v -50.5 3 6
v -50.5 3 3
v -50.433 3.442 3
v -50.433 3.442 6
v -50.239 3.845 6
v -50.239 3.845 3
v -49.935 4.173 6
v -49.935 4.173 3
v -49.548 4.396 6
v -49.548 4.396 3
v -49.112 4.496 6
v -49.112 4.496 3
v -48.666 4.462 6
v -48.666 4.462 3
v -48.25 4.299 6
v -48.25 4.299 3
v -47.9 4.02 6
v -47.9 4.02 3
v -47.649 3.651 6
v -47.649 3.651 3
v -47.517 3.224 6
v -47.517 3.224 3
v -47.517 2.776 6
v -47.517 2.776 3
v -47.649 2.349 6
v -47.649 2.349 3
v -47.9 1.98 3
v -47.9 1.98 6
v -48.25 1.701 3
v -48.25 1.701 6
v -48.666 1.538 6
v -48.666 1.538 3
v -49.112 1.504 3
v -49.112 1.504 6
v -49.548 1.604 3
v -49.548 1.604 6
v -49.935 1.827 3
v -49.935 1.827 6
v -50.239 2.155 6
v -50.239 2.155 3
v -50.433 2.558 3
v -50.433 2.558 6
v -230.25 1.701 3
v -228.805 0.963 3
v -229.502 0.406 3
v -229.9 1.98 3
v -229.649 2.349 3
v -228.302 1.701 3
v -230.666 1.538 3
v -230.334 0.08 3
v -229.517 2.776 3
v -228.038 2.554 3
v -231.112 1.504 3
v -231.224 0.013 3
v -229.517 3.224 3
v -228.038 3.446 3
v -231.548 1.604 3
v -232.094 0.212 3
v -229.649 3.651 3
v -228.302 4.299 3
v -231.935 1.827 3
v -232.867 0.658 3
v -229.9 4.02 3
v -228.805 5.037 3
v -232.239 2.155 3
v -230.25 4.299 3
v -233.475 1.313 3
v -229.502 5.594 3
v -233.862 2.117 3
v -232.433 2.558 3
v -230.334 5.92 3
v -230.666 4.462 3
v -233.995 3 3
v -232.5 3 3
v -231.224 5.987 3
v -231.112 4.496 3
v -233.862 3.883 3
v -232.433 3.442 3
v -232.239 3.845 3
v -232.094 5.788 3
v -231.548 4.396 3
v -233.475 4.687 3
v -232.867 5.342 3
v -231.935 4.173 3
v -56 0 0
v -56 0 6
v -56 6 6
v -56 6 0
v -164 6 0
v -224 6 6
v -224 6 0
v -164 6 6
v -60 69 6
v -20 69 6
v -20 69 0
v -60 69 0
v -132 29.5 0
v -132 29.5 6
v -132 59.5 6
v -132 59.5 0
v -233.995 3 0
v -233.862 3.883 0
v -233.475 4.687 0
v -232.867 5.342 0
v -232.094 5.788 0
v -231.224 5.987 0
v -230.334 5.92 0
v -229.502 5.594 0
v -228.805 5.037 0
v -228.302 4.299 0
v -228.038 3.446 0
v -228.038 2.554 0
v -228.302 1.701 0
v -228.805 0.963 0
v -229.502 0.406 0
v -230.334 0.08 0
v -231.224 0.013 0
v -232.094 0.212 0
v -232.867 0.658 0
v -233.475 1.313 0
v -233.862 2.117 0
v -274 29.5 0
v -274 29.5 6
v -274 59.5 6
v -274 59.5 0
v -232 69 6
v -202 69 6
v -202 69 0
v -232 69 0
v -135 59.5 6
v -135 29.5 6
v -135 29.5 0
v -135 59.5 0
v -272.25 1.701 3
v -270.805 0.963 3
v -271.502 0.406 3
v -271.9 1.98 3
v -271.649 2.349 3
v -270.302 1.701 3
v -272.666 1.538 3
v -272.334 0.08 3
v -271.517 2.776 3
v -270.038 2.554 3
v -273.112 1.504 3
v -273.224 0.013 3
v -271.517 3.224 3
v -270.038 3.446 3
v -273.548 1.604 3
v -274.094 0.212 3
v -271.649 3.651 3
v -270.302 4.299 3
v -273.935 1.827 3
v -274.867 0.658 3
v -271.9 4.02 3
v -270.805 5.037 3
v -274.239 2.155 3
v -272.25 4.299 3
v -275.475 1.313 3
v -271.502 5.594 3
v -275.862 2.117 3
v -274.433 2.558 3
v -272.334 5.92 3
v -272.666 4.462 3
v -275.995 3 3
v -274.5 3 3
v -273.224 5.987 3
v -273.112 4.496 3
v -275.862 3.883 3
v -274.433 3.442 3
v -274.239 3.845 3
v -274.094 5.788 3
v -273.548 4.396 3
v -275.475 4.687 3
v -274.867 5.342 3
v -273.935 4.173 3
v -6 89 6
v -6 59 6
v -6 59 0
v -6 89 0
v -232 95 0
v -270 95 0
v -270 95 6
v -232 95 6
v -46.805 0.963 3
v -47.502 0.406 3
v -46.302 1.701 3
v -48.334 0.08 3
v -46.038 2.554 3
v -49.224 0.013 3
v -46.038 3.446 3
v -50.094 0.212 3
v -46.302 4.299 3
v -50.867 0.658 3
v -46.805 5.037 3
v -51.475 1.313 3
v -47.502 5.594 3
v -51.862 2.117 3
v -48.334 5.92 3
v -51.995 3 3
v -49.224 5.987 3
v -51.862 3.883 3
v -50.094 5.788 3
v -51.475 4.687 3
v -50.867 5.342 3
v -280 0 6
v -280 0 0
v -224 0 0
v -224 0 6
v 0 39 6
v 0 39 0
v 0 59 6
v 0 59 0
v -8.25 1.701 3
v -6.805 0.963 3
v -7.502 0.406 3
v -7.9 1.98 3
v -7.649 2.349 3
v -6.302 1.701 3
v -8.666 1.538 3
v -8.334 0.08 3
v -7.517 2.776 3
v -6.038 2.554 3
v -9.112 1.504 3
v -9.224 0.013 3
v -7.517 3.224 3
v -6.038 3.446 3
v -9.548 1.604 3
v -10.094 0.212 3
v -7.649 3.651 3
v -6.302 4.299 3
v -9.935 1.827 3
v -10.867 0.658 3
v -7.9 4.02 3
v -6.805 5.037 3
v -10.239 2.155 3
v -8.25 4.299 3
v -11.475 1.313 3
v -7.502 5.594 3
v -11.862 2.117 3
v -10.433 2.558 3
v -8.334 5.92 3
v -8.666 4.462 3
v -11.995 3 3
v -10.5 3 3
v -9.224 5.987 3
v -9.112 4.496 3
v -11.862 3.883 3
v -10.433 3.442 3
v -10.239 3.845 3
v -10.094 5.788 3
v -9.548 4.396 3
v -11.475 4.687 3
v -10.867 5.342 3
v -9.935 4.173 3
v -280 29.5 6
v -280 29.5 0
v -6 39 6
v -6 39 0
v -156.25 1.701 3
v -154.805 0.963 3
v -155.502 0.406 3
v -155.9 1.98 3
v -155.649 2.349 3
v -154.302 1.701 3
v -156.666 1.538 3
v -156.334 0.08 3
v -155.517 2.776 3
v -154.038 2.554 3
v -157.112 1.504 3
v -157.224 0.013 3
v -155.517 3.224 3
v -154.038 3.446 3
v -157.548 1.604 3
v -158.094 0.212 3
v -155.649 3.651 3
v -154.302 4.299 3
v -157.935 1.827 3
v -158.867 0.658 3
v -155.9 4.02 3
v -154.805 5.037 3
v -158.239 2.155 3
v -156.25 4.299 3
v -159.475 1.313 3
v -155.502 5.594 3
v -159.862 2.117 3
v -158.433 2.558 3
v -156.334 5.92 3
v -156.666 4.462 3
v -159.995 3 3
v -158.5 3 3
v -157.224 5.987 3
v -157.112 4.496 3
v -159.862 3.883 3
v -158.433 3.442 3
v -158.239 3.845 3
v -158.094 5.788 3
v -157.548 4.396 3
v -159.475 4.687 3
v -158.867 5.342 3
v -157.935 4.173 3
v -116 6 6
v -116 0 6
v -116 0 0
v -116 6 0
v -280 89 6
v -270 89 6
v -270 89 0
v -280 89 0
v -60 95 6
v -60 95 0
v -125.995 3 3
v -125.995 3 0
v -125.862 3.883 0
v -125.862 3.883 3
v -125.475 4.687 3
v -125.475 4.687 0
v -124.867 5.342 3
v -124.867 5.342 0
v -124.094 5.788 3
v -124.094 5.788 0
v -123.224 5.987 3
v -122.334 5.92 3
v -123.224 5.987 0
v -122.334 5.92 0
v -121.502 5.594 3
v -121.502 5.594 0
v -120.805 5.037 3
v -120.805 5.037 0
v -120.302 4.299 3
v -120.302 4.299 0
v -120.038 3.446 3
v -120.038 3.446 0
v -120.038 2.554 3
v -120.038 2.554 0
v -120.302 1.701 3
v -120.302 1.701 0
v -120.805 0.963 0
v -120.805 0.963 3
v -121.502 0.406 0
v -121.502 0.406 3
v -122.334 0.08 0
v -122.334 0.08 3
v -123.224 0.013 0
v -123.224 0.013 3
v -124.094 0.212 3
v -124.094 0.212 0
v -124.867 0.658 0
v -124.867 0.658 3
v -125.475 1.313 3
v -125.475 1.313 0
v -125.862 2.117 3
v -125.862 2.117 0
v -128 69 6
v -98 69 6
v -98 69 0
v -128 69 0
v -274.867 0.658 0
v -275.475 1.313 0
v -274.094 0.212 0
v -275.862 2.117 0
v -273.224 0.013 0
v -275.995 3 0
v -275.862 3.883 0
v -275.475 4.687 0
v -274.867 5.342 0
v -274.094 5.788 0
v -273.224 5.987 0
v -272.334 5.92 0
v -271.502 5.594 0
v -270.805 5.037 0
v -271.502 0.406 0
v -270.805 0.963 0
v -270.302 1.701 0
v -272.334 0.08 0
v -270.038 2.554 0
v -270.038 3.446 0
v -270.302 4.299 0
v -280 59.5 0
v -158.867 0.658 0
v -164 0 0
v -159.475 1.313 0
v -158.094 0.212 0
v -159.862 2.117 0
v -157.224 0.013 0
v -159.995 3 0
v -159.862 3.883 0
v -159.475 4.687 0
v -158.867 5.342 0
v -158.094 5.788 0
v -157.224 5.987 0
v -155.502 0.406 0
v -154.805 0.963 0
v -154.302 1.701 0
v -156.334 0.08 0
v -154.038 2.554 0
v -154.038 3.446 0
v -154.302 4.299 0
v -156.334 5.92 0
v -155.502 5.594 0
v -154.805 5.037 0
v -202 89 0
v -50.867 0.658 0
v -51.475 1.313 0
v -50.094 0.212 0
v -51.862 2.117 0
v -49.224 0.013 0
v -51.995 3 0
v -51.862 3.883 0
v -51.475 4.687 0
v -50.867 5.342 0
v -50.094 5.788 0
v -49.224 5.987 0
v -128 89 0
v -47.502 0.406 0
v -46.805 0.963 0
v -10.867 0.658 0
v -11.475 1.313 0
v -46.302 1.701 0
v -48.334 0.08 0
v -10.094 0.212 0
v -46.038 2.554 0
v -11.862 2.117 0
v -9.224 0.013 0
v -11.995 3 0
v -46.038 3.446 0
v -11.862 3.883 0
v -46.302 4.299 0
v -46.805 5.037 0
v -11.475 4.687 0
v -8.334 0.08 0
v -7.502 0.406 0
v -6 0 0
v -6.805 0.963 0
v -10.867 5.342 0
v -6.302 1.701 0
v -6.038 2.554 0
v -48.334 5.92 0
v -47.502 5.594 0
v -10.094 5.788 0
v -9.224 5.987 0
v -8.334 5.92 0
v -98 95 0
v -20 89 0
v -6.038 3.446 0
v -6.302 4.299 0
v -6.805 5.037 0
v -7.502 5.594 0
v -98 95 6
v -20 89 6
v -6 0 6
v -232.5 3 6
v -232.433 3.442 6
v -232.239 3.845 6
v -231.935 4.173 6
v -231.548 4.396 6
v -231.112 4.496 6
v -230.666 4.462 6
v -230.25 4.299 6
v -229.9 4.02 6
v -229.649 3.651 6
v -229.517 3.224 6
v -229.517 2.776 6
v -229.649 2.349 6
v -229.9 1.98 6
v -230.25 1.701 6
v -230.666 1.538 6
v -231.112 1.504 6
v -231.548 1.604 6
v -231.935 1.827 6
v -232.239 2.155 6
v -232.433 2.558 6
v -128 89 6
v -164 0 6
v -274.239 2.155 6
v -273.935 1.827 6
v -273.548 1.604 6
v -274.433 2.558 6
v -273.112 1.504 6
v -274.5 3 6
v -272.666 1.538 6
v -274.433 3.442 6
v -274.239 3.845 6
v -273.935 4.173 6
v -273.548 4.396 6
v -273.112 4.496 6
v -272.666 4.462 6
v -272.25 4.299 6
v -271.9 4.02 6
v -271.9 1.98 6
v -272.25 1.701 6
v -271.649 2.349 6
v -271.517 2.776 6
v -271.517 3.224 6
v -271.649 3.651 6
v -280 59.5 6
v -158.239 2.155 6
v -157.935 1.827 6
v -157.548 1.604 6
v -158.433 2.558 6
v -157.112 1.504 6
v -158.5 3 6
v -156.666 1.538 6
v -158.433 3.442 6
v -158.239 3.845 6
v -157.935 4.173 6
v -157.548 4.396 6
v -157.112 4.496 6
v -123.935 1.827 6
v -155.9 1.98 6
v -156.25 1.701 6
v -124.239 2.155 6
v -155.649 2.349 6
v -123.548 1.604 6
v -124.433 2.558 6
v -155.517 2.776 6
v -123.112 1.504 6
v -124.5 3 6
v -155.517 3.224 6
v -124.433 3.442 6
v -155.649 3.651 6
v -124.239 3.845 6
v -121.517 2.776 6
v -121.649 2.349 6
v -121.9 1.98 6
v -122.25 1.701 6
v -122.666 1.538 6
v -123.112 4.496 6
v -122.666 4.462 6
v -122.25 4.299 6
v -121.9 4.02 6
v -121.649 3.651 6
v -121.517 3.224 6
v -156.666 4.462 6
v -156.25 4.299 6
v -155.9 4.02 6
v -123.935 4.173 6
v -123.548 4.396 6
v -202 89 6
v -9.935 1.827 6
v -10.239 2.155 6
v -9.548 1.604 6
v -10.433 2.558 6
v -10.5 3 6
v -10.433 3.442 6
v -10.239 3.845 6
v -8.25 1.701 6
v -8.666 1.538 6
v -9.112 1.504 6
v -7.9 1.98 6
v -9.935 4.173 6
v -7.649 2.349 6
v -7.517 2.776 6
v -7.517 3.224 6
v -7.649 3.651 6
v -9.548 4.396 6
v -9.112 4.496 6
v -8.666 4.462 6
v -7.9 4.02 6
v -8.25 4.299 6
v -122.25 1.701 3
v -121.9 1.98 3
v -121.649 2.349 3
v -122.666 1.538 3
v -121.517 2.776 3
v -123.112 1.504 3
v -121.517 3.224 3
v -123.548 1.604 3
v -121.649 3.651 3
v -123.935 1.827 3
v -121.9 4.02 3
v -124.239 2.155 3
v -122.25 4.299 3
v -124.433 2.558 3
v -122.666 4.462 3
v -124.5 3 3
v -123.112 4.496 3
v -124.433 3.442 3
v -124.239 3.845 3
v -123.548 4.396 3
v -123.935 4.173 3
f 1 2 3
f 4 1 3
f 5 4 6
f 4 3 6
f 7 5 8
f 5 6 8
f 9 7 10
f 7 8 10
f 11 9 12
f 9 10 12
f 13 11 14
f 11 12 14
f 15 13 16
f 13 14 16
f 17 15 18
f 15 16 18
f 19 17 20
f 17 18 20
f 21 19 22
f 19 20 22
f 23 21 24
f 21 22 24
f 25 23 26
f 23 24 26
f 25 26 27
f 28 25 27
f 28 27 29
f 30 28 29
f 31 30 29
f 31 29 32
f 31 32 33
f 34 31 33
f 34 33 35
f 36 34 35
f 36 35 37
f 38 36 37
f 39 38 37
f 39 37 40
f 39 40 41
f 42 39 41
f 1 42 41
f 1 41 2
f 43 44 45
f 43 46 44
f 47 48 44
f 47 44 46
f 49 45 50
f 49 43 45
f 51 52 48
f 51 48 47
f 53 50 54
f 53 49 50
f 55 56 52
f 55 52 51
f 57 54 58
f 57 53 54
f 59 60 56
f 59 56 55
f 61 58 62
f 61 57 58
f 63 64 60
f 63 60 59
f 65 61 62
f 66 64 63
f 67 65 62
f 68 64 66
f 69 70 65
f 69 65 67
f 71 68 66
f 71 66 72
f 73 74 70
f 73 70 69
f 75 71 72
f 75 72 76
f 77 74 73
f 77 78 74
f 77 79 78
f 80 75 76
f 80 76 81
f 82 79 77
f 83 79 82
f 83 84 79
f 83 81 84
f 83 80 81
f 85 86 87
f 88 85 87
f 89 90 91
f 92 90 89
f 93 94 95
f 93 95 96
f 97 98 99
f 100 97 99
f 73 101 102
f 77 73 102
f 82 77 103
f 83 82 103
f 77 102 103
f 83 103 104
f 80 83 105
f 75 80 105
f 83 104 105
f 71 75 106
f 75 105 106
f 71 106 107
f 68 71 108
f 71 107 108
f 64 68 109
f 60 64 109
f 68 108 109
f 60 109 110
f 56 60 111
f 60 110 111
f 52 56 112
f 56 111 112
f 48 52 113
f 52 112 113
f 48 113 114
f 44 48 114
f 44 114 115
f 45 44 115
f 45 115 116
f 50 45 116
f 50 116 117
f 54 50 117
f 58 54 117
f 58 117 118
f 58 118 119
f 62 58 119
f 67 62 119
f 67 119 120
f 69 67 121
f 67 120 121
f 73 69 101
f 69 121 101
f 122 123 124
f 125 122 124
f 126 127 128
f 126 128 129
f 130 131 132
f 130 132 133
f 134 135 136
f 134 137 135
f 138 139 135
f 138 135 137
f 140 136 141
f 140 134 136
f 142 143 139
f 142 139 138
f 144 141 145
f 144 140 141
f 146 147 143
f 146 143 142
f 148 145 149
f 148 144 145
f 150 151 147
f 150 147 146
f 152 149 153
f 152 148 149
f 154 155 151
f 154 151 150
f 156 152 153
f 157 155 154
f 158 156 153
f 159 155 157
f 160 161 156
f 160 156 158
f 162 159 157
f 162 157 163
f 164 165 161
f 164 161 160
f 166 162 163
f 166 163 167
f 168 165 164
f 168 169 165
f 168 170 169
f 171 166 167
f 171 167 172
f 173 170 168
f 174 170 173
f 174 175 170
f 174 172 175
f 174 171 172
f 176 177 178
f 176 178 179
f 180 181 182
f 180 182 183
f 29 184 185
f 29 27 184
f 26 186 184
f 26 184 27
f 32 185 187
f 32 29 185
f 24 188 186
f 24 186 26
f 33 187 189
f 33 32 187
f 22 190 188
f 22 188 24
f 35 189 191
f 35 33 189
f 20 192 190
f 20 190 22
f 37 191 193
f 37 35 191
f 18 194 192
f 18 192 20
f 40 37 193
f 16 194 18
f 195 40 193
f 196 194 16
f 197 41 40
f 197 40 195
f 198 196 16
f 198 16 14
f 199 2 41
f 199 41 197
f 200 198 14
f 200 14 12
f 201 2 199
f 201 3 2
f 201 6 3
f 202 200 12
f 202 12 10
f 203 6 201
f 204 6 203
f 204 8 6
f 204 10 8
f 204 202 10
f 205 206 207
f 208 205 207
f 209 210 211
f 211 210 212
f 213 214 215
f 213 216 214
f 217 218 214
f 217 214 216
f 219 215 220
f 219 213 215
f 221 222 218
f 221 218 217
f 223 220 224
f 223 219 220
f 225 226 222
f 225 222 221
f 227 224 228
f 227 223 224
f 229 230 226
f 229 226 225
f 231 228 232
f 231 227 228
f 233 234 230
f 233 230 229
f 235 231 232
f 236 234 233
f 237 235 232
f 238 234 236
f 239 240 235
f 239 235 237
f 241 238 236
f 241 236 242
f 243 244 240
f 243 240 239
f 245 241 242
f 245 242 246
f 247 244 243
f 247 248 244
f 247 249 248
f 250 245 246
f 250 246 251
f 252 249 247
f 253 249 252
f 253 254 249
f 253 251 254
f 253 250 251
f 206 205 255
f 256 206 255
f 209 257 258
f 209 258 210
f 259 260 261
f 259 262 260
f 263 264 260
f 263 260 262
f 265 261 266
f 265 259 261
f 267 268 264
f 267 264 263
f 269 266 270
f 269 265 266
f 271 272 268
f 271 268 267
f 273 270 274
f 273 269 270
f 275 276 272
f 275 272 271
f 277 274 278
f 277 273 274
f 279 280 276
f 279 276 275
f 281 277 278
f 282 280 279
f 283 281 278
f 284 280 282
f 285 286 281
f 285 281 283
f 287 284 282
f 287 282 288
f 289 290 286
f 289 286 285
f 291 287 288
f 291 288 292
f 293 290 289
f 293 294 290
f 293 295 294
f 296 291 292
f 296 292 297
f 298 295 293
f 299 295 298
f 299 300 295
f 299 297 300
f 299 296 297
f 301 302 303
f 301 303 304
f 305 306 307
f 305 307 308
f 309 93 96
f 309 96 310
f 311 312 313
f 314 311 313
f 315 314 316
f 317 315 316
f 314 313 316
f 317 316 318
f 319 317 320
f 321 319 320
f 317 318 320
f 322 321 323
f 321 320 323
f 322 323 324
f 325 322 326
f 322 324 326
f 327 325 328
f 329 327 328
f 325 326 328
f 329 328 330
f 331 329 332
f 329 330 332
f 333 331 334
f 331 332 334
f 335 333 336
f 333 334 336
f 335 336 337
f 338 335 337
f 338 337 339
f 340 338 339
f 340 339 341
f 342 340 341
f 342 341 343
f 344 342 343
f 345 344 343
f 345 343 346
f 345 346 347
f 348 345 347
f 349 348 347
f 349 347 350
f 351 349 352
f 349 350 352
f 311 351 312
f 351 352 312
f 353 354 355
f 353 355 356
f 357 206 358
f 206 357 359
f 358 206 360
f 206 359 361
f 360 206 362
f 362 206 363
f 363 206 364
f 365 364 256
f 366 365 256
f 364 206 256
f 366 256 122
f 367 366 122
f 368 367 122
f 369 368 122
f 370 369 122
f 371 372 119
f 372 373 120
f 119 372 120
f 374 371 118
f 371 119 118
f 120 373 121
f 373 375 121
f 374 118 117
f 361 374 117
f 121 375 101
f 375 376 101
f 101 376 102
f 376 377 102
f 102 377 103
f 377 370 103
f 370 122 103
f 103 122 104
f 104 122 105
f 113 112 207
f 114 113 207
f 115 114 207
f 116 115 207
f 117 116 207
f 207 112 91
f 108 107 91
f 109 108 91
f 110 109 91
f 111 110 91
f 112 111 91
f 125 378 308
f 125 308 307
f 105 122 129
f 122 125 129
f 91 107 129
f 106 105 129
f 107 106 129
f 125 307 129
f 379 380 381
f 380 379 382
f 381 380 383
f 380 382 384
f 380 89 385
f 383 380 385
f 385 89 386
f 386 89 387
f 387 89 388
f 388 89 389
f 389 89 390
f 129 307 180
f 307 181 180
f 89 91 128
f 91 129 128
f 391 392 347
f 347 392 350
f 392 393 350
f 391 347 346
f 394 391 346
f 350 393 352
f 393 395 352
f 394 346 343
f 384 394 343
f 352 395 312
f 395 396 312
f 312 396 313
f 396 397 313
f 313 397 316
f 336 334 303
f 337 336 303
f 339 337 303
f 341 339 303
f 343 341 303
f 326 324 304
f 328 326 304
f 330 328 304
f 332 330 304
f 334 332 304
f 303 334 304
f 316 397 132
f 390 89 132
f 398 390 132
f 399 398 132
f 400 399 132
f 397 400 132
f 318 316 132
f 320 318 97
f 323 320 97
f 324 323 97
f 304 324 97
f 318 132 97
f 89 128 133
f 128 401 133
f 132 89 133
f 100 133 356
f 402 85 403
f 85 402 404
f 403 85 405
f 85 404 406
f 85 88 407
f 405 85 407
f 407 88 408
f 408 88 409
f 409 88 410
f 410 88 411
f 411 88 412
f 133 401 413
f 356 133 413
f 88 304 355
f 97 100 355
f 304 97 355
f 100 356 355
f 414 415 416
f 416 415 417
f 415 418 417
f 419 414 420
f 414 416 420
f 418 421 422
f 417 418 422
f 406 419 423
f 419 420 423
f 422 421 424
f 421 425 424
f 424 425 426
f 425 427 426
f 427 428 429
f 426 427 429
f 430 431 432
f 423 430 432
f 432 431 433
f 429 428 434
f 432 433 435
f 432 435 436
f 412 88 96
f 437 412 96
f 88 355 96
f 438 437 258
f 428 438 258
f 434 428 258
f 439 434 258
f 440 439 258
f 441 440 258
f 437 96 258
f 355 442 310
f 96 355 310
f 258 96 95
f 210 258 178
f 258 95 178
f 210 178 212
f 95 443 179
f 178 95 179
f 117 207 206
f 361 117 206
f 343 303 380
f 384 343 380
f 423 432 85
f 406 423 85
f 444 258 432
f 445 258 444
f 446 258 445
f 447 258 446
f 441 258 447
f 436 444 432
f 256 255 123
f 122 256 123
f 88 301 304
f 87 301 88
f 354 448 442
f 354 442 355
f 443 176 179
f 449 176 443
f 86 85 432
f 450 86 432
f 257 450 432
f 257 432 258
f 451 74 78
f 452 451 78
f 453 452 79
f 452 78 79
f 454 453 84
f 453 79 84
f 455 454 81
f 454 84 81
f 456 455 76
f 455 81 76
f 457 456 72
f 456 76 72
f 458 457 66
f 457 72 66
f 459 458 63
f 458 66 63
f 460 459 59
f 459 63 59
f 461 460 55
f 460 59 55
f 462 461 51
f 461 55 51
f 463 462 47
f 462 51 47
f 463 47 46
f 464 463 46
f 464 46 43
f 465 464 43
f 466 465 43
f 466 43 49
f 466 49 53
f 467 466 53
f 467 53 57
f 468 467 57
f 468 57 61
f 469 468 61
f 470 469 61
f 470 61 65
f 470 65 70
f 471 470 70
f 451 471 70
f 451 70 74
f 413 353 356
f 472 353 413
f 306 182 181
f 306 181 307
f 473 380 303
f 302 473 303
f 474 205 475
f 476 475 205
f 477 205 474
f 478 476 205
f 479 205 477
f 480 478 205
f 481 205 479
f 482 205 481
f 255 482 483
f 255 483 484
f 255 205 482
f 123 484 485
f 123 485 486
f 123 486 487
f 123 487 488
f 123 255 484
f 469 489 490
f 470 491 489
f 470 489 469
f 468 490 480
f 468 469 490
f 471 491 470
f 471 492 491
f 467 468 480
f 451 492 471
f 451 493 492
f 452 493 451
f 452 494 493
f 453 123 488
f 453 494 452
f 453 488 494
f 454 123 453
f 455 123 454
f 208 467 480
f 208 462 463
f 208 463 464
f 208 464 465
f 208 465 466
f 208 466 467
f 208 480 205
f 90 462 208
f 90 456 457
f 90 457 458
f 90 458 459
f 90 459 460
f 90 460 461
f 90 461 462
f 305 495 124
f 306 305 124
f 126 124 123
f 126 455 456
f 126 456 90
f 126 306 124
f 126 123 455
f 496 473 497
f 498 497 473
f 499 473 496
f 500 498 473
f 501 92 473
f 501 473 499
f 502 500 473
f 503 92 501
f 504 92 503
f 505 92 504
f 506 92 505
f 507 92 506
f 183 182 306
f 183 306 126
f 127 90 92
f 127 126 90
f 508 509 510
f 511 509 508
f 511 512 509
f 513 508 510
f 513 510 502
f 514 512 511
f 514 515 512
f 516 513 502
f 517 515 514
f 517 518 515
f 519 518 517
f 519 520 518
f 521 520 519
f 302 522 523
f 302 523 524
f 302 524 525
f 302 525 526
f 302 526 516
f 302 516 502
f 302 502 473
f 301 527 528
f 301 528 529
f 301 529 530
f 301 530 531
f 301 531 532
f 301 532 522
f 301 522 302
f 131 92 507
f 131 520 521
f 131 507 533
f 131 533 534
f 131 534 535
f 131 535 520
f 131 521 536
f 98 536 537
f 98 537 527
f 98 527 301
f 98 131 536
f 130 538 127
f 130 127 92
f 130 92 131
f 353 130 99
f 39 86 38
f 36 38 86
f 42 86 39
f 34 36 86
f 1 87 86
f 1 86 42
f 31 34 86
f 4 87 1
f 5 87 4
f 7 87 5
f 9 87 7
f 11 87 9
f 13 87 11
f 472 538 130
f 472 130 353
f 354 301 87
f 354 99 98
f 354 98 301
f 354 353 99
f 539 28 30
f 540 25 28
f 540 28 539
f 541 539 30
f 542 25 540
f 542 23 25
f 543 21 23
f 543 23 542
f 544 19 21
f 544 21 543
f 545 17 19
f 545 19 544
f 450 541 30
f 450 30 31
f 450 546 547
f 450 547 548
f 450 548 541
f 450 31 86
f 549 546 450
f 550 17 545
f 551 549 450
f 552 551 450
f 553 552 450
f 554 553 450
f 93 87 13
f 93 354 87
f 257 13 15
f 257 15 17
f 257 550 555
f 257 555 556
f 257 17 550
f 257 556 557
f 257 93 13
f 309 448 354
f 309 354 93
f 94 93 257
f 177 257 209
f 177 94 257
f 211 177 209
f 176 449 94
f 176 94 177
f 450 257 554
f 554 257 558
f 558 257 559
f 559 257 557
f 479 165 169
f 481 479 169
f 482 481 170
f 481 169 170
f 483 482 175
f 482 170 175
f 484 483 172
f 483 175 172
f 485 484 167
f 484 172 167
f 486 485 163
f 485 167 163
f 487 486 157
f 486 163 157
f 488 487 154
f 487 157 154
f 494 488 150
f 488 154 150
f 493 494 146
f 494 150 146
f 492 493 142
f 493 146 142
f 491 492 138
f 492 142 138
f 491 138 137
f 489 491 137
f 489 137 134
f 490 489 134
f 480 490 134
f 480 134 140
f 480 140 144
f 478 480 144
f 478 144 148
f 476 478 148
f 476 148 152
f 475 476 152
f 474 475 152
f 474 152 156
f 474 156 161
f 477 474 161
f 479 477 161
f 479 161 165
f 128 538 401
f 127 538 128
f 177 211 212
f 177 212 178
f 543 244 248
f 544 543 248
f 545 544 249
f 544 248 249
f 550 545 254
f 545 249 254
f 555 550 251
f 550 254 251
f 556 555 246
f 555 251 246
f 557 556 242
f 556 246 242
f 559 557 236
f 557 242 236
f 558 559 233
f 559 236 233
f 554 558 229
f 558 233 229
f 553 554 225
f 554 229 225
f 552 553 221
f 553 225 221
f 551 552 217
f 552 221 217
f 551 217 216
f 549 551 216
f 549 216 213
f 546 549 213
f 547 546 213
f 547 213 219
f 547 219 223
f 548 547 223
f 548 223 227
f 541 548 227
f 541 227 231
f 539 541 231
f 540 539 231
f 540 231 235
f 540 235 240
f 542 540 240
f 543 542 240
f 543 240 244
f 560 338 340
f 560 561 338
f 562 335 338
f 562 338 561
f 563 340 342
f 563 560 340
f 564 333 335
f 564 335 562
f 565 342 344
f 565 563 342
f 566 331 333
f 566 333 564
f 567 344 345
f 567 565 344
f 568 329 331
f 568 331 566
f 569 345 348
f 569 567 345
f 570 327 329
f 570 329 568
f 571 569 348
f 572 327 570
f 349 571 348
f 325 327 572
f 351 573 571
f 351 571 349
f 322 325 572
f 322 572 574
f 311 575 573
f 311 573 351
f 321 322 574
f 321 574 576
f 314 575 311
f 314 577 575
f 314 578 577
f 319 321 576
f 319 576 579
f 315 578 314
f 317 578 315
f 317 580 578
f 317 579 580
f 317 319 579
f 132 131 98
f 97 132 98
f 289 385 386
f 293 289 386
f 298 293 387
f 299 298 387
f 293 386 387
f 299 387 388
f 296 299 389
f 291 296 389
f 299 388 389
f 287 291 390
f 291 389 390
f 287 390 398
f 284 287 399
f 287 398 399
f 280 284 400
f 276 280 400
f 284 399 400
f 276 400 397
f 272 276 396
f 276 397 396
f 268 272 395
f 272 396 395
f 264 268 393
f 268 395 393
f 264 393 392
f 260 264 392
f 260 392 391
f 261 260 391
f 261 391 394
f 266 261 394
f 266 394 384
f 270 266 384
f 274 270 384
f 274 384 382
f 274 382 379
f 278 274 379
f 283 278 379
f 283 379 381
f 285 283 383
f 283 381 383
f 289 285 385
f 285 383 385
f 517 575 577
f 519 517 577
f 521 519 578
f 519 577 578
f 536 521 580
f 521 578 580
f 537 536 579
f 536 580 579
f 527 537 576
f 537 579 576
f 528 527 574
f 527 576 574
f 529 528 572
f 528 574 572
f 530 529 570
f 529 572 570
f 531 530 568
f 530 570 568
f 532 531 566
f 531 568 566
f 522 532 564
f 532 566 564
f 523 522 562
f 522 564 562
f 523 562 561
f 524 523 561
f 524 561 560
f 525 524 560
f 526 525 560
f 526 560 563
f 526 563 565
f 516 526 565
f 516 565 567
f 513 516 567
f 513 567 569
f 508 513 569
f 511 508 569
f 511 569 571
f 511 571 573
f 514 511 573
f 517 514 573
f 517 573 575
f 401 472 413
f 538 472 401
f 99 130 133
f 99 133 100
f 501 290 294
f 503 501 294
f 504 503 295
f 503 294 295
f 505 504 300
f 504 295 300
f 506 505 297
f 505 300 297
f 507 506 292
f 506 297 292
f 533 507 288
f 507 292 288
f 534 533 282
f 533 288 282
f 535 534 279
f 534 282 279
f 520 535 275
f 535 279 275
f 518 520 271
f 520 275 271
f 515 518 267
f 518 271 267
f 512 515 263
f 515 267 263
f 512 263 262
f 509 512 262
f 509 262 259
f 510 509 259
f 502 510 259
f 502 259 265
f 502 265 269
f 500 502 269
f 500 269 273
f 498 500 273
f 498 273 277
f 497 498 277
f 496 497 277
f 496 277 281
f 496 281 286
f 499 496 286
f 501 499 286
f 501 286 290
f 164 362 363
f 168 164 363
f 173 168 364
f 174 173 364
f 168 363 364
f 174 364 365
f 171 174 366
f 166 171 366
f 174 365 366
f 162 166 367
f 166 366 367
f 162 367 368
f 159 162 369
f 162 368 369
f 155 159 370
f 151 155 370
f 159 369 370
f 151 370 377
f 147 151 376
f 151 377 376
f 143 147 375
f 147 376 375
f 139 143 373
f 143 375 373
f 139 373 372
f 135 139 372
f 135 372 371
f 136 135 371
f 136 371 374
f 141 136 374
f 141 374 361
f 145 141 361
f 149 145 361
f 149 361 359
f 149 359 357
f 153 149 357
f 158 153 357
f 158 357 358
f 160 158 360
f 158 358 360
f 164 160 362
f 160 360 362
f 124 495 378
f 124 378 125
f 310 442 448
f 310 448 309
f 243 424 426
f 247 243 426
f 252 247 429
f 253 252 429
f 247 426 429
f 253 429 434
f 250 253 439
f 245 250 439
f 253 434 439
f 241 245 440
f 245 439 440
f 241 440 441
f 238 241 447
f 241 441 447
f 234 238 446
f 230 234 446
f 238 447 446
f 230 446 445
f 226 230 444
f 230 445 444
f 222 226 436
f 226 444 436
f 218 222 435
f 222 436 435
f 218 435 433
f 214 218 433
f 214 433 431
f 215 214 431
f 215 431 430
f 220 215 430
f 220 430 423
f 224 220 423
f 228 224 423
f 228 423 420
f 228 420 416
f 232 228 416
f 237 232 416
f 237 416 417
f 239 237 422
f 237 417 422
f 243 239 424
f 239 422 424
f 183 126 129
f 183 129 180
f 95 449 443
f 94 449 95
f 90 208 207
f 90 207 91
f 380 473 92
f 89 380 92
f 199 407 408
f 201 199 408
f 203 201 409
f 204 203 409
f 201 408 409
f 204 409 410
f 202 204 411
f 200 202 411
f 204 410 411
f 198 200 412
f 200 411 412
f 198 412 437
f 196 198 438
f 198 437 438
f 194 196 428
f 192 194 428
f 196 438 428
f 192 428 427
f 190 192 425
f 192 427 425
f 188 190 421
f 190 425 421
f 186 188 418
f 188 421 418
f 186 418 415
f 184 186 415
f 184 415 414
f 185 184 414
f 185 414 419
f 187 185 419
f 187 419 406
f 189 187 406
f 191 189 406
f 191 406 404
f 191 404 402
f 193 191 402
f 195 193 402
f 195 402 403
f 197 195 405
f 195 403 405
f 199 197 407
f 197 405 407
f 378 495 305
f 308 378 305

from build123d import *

# Parameters (mm, degrees)
ESQUISSE2_W             = 330
ESQUISSE2_H             = 95
BOSS_EXTRU_1_DEPTH      = 6
ESQUISSE3_W             = 6
ESQUISSE3_H             = 39
ESQUISSE3_W_2           = 60
ESQUISSE3_H_2           = 6
ESQUISSE3_H_3           = 30
ESQUISSE3_W_3           = 3
ENL_V_MAT_EXTRU_1_DEPTH = 344.45450936
ESQUISSE4_W             = 56.799161249
ESQUISSE4_H             = 89
ENL_V_MAT_EXTRU_2_DEPTH = 344.45450936
ESQUISSE5_R             = 1.5
ENL_V_MAT_EXTRU_3_DEPTH = 296.738059776
ESQUISSE6_R             = 2.995
ENL_V_MAT_EXTRU_5_DEPTH = 3


with BuildPart() as part:
    # Esquisse2 → Boss.-Extru.1 (new body)
    with BuildSketch(Plane.XY):
        with Locations((-165, 47.5)):
            Rectangle(ESQUISSE2_W, ESQUISSE2_H)
    extrude(amount=BOSS_EXTRU_1_DEPTH)

    # Esquisse3 → Enlèv. mat.-Extru.1 (cut, through all)
    with BuildSketch(Plane.XY.offset(6)):
        Polygon((-60, 95), (0, 95), (0, 59), (-6, 59), (-6, 89), (-20, 89), (-20, 69), (-60, 69), align=None)
        with Locations((-3, 19.5)):
            Rectangle(ESQUISSE3_W, ESQUISSE3_H)
        Polygon((-330, 95), (-270, 95), (-270, 89), (-324, 89), (-324, 59), (-330, 59), align=None)
        with Locations((-86, 3)):
            Rectangle(ESQUISSE3_W_2, ESQUISSE3_H_2)
        with Locations((-194, 3)):
            Rectangle(ESQUISSE3_W_2, ESQUISSE3_H_2)
        with Locations((-277, 44.5)):
            Rectangle(ESQUISSE3_W, ESQUISSE3_H_3)
        with Locations((-327, 19.5)):
            Rectangle(ESQUISSE3_W, ESQUISSE3_H)
        Polygon((-98, 95), (-98, 69), (-128, 69), (-128, 89), (-202, 89), (-202, 69), (-232, 69), (-232, 95), align=None)
        with Locations((-133.5, 44.5)):
            Rectangle(ESQUISSE3_W_3, ESQUISSE3_H_3)
    extrude(amount=-ENL_V_MAT_EXTRU_1_DEPTH, mode=Mode.SUBTRACT)

    # Esquisse4 → Enlèv. mat.-Extru.2 (cut, through all)
    with BuildSketch(Plane.XY.offset(6)):
        with Locations((-308.399580625, 44.5)):
            Rectangle(ESQUISSE4_W, ESQUISSE4_H)
    extrude(amount=-ENL_V_MAT_EXTRU_2_DEPTH, mode=Mode.SUBTRACT)

    # Esquisse5 → Enlèv. mat.-Extru.3 (cut, through all)
    with BuildSketch(Plane(origin=(0, 0, 0), x_dir=(-1, 0, 0), z_dir=(0, 0, -1))):
        with Locations((9, 3)):
            Circle(ESQUISSE5_R)
        with Locations((49, 3)):
            Circle(ESQUISSE5_R)
        with Locations((123, 3)):
            Circle(ESQUISSE5_R)
        with Locations((157, 3)):
            Circle(ESQUISSE5_R)
        with Locations((231, 3)):
            Circle(ESQUISSE5_R)
        with Locations((273, 3)):
            Circle(ESQUISSE5_R)
    extrude(amount=-ENL_V_MAT_EXTRU_3_DEPTH, mode=Mode.SUBTRACT)

    # Esquisse6 → Enlèv. mat.-Extru.5 (cut)
    with BuildSketch(Plane(origin=(0, 0, 0), x_dir=(-1, 0, 0), z_dir=(0, 0, -1))):
        with Locations((9, 3)):
            Circle(ESQUISSE6_R)
        with Locations((49, 3)):
            Circle(ESQUISSE6_R)
        with Locations((123, 3)):
            Circle(ESQUISSE6_R)
        with Locations((157, 3)):
            Circle(ESQUISSE6_R)
        with Locations((273, 3)):
            Circle(ESQUISSE6_R)
        with Locations((231, 3)):
            Circle(ESQUISSE6_R)
    extrude(amount=-ENL_V_MAT_EXTRU_5_DEPTH, mode=Mode.SUBTRACT)


solid = part.part
